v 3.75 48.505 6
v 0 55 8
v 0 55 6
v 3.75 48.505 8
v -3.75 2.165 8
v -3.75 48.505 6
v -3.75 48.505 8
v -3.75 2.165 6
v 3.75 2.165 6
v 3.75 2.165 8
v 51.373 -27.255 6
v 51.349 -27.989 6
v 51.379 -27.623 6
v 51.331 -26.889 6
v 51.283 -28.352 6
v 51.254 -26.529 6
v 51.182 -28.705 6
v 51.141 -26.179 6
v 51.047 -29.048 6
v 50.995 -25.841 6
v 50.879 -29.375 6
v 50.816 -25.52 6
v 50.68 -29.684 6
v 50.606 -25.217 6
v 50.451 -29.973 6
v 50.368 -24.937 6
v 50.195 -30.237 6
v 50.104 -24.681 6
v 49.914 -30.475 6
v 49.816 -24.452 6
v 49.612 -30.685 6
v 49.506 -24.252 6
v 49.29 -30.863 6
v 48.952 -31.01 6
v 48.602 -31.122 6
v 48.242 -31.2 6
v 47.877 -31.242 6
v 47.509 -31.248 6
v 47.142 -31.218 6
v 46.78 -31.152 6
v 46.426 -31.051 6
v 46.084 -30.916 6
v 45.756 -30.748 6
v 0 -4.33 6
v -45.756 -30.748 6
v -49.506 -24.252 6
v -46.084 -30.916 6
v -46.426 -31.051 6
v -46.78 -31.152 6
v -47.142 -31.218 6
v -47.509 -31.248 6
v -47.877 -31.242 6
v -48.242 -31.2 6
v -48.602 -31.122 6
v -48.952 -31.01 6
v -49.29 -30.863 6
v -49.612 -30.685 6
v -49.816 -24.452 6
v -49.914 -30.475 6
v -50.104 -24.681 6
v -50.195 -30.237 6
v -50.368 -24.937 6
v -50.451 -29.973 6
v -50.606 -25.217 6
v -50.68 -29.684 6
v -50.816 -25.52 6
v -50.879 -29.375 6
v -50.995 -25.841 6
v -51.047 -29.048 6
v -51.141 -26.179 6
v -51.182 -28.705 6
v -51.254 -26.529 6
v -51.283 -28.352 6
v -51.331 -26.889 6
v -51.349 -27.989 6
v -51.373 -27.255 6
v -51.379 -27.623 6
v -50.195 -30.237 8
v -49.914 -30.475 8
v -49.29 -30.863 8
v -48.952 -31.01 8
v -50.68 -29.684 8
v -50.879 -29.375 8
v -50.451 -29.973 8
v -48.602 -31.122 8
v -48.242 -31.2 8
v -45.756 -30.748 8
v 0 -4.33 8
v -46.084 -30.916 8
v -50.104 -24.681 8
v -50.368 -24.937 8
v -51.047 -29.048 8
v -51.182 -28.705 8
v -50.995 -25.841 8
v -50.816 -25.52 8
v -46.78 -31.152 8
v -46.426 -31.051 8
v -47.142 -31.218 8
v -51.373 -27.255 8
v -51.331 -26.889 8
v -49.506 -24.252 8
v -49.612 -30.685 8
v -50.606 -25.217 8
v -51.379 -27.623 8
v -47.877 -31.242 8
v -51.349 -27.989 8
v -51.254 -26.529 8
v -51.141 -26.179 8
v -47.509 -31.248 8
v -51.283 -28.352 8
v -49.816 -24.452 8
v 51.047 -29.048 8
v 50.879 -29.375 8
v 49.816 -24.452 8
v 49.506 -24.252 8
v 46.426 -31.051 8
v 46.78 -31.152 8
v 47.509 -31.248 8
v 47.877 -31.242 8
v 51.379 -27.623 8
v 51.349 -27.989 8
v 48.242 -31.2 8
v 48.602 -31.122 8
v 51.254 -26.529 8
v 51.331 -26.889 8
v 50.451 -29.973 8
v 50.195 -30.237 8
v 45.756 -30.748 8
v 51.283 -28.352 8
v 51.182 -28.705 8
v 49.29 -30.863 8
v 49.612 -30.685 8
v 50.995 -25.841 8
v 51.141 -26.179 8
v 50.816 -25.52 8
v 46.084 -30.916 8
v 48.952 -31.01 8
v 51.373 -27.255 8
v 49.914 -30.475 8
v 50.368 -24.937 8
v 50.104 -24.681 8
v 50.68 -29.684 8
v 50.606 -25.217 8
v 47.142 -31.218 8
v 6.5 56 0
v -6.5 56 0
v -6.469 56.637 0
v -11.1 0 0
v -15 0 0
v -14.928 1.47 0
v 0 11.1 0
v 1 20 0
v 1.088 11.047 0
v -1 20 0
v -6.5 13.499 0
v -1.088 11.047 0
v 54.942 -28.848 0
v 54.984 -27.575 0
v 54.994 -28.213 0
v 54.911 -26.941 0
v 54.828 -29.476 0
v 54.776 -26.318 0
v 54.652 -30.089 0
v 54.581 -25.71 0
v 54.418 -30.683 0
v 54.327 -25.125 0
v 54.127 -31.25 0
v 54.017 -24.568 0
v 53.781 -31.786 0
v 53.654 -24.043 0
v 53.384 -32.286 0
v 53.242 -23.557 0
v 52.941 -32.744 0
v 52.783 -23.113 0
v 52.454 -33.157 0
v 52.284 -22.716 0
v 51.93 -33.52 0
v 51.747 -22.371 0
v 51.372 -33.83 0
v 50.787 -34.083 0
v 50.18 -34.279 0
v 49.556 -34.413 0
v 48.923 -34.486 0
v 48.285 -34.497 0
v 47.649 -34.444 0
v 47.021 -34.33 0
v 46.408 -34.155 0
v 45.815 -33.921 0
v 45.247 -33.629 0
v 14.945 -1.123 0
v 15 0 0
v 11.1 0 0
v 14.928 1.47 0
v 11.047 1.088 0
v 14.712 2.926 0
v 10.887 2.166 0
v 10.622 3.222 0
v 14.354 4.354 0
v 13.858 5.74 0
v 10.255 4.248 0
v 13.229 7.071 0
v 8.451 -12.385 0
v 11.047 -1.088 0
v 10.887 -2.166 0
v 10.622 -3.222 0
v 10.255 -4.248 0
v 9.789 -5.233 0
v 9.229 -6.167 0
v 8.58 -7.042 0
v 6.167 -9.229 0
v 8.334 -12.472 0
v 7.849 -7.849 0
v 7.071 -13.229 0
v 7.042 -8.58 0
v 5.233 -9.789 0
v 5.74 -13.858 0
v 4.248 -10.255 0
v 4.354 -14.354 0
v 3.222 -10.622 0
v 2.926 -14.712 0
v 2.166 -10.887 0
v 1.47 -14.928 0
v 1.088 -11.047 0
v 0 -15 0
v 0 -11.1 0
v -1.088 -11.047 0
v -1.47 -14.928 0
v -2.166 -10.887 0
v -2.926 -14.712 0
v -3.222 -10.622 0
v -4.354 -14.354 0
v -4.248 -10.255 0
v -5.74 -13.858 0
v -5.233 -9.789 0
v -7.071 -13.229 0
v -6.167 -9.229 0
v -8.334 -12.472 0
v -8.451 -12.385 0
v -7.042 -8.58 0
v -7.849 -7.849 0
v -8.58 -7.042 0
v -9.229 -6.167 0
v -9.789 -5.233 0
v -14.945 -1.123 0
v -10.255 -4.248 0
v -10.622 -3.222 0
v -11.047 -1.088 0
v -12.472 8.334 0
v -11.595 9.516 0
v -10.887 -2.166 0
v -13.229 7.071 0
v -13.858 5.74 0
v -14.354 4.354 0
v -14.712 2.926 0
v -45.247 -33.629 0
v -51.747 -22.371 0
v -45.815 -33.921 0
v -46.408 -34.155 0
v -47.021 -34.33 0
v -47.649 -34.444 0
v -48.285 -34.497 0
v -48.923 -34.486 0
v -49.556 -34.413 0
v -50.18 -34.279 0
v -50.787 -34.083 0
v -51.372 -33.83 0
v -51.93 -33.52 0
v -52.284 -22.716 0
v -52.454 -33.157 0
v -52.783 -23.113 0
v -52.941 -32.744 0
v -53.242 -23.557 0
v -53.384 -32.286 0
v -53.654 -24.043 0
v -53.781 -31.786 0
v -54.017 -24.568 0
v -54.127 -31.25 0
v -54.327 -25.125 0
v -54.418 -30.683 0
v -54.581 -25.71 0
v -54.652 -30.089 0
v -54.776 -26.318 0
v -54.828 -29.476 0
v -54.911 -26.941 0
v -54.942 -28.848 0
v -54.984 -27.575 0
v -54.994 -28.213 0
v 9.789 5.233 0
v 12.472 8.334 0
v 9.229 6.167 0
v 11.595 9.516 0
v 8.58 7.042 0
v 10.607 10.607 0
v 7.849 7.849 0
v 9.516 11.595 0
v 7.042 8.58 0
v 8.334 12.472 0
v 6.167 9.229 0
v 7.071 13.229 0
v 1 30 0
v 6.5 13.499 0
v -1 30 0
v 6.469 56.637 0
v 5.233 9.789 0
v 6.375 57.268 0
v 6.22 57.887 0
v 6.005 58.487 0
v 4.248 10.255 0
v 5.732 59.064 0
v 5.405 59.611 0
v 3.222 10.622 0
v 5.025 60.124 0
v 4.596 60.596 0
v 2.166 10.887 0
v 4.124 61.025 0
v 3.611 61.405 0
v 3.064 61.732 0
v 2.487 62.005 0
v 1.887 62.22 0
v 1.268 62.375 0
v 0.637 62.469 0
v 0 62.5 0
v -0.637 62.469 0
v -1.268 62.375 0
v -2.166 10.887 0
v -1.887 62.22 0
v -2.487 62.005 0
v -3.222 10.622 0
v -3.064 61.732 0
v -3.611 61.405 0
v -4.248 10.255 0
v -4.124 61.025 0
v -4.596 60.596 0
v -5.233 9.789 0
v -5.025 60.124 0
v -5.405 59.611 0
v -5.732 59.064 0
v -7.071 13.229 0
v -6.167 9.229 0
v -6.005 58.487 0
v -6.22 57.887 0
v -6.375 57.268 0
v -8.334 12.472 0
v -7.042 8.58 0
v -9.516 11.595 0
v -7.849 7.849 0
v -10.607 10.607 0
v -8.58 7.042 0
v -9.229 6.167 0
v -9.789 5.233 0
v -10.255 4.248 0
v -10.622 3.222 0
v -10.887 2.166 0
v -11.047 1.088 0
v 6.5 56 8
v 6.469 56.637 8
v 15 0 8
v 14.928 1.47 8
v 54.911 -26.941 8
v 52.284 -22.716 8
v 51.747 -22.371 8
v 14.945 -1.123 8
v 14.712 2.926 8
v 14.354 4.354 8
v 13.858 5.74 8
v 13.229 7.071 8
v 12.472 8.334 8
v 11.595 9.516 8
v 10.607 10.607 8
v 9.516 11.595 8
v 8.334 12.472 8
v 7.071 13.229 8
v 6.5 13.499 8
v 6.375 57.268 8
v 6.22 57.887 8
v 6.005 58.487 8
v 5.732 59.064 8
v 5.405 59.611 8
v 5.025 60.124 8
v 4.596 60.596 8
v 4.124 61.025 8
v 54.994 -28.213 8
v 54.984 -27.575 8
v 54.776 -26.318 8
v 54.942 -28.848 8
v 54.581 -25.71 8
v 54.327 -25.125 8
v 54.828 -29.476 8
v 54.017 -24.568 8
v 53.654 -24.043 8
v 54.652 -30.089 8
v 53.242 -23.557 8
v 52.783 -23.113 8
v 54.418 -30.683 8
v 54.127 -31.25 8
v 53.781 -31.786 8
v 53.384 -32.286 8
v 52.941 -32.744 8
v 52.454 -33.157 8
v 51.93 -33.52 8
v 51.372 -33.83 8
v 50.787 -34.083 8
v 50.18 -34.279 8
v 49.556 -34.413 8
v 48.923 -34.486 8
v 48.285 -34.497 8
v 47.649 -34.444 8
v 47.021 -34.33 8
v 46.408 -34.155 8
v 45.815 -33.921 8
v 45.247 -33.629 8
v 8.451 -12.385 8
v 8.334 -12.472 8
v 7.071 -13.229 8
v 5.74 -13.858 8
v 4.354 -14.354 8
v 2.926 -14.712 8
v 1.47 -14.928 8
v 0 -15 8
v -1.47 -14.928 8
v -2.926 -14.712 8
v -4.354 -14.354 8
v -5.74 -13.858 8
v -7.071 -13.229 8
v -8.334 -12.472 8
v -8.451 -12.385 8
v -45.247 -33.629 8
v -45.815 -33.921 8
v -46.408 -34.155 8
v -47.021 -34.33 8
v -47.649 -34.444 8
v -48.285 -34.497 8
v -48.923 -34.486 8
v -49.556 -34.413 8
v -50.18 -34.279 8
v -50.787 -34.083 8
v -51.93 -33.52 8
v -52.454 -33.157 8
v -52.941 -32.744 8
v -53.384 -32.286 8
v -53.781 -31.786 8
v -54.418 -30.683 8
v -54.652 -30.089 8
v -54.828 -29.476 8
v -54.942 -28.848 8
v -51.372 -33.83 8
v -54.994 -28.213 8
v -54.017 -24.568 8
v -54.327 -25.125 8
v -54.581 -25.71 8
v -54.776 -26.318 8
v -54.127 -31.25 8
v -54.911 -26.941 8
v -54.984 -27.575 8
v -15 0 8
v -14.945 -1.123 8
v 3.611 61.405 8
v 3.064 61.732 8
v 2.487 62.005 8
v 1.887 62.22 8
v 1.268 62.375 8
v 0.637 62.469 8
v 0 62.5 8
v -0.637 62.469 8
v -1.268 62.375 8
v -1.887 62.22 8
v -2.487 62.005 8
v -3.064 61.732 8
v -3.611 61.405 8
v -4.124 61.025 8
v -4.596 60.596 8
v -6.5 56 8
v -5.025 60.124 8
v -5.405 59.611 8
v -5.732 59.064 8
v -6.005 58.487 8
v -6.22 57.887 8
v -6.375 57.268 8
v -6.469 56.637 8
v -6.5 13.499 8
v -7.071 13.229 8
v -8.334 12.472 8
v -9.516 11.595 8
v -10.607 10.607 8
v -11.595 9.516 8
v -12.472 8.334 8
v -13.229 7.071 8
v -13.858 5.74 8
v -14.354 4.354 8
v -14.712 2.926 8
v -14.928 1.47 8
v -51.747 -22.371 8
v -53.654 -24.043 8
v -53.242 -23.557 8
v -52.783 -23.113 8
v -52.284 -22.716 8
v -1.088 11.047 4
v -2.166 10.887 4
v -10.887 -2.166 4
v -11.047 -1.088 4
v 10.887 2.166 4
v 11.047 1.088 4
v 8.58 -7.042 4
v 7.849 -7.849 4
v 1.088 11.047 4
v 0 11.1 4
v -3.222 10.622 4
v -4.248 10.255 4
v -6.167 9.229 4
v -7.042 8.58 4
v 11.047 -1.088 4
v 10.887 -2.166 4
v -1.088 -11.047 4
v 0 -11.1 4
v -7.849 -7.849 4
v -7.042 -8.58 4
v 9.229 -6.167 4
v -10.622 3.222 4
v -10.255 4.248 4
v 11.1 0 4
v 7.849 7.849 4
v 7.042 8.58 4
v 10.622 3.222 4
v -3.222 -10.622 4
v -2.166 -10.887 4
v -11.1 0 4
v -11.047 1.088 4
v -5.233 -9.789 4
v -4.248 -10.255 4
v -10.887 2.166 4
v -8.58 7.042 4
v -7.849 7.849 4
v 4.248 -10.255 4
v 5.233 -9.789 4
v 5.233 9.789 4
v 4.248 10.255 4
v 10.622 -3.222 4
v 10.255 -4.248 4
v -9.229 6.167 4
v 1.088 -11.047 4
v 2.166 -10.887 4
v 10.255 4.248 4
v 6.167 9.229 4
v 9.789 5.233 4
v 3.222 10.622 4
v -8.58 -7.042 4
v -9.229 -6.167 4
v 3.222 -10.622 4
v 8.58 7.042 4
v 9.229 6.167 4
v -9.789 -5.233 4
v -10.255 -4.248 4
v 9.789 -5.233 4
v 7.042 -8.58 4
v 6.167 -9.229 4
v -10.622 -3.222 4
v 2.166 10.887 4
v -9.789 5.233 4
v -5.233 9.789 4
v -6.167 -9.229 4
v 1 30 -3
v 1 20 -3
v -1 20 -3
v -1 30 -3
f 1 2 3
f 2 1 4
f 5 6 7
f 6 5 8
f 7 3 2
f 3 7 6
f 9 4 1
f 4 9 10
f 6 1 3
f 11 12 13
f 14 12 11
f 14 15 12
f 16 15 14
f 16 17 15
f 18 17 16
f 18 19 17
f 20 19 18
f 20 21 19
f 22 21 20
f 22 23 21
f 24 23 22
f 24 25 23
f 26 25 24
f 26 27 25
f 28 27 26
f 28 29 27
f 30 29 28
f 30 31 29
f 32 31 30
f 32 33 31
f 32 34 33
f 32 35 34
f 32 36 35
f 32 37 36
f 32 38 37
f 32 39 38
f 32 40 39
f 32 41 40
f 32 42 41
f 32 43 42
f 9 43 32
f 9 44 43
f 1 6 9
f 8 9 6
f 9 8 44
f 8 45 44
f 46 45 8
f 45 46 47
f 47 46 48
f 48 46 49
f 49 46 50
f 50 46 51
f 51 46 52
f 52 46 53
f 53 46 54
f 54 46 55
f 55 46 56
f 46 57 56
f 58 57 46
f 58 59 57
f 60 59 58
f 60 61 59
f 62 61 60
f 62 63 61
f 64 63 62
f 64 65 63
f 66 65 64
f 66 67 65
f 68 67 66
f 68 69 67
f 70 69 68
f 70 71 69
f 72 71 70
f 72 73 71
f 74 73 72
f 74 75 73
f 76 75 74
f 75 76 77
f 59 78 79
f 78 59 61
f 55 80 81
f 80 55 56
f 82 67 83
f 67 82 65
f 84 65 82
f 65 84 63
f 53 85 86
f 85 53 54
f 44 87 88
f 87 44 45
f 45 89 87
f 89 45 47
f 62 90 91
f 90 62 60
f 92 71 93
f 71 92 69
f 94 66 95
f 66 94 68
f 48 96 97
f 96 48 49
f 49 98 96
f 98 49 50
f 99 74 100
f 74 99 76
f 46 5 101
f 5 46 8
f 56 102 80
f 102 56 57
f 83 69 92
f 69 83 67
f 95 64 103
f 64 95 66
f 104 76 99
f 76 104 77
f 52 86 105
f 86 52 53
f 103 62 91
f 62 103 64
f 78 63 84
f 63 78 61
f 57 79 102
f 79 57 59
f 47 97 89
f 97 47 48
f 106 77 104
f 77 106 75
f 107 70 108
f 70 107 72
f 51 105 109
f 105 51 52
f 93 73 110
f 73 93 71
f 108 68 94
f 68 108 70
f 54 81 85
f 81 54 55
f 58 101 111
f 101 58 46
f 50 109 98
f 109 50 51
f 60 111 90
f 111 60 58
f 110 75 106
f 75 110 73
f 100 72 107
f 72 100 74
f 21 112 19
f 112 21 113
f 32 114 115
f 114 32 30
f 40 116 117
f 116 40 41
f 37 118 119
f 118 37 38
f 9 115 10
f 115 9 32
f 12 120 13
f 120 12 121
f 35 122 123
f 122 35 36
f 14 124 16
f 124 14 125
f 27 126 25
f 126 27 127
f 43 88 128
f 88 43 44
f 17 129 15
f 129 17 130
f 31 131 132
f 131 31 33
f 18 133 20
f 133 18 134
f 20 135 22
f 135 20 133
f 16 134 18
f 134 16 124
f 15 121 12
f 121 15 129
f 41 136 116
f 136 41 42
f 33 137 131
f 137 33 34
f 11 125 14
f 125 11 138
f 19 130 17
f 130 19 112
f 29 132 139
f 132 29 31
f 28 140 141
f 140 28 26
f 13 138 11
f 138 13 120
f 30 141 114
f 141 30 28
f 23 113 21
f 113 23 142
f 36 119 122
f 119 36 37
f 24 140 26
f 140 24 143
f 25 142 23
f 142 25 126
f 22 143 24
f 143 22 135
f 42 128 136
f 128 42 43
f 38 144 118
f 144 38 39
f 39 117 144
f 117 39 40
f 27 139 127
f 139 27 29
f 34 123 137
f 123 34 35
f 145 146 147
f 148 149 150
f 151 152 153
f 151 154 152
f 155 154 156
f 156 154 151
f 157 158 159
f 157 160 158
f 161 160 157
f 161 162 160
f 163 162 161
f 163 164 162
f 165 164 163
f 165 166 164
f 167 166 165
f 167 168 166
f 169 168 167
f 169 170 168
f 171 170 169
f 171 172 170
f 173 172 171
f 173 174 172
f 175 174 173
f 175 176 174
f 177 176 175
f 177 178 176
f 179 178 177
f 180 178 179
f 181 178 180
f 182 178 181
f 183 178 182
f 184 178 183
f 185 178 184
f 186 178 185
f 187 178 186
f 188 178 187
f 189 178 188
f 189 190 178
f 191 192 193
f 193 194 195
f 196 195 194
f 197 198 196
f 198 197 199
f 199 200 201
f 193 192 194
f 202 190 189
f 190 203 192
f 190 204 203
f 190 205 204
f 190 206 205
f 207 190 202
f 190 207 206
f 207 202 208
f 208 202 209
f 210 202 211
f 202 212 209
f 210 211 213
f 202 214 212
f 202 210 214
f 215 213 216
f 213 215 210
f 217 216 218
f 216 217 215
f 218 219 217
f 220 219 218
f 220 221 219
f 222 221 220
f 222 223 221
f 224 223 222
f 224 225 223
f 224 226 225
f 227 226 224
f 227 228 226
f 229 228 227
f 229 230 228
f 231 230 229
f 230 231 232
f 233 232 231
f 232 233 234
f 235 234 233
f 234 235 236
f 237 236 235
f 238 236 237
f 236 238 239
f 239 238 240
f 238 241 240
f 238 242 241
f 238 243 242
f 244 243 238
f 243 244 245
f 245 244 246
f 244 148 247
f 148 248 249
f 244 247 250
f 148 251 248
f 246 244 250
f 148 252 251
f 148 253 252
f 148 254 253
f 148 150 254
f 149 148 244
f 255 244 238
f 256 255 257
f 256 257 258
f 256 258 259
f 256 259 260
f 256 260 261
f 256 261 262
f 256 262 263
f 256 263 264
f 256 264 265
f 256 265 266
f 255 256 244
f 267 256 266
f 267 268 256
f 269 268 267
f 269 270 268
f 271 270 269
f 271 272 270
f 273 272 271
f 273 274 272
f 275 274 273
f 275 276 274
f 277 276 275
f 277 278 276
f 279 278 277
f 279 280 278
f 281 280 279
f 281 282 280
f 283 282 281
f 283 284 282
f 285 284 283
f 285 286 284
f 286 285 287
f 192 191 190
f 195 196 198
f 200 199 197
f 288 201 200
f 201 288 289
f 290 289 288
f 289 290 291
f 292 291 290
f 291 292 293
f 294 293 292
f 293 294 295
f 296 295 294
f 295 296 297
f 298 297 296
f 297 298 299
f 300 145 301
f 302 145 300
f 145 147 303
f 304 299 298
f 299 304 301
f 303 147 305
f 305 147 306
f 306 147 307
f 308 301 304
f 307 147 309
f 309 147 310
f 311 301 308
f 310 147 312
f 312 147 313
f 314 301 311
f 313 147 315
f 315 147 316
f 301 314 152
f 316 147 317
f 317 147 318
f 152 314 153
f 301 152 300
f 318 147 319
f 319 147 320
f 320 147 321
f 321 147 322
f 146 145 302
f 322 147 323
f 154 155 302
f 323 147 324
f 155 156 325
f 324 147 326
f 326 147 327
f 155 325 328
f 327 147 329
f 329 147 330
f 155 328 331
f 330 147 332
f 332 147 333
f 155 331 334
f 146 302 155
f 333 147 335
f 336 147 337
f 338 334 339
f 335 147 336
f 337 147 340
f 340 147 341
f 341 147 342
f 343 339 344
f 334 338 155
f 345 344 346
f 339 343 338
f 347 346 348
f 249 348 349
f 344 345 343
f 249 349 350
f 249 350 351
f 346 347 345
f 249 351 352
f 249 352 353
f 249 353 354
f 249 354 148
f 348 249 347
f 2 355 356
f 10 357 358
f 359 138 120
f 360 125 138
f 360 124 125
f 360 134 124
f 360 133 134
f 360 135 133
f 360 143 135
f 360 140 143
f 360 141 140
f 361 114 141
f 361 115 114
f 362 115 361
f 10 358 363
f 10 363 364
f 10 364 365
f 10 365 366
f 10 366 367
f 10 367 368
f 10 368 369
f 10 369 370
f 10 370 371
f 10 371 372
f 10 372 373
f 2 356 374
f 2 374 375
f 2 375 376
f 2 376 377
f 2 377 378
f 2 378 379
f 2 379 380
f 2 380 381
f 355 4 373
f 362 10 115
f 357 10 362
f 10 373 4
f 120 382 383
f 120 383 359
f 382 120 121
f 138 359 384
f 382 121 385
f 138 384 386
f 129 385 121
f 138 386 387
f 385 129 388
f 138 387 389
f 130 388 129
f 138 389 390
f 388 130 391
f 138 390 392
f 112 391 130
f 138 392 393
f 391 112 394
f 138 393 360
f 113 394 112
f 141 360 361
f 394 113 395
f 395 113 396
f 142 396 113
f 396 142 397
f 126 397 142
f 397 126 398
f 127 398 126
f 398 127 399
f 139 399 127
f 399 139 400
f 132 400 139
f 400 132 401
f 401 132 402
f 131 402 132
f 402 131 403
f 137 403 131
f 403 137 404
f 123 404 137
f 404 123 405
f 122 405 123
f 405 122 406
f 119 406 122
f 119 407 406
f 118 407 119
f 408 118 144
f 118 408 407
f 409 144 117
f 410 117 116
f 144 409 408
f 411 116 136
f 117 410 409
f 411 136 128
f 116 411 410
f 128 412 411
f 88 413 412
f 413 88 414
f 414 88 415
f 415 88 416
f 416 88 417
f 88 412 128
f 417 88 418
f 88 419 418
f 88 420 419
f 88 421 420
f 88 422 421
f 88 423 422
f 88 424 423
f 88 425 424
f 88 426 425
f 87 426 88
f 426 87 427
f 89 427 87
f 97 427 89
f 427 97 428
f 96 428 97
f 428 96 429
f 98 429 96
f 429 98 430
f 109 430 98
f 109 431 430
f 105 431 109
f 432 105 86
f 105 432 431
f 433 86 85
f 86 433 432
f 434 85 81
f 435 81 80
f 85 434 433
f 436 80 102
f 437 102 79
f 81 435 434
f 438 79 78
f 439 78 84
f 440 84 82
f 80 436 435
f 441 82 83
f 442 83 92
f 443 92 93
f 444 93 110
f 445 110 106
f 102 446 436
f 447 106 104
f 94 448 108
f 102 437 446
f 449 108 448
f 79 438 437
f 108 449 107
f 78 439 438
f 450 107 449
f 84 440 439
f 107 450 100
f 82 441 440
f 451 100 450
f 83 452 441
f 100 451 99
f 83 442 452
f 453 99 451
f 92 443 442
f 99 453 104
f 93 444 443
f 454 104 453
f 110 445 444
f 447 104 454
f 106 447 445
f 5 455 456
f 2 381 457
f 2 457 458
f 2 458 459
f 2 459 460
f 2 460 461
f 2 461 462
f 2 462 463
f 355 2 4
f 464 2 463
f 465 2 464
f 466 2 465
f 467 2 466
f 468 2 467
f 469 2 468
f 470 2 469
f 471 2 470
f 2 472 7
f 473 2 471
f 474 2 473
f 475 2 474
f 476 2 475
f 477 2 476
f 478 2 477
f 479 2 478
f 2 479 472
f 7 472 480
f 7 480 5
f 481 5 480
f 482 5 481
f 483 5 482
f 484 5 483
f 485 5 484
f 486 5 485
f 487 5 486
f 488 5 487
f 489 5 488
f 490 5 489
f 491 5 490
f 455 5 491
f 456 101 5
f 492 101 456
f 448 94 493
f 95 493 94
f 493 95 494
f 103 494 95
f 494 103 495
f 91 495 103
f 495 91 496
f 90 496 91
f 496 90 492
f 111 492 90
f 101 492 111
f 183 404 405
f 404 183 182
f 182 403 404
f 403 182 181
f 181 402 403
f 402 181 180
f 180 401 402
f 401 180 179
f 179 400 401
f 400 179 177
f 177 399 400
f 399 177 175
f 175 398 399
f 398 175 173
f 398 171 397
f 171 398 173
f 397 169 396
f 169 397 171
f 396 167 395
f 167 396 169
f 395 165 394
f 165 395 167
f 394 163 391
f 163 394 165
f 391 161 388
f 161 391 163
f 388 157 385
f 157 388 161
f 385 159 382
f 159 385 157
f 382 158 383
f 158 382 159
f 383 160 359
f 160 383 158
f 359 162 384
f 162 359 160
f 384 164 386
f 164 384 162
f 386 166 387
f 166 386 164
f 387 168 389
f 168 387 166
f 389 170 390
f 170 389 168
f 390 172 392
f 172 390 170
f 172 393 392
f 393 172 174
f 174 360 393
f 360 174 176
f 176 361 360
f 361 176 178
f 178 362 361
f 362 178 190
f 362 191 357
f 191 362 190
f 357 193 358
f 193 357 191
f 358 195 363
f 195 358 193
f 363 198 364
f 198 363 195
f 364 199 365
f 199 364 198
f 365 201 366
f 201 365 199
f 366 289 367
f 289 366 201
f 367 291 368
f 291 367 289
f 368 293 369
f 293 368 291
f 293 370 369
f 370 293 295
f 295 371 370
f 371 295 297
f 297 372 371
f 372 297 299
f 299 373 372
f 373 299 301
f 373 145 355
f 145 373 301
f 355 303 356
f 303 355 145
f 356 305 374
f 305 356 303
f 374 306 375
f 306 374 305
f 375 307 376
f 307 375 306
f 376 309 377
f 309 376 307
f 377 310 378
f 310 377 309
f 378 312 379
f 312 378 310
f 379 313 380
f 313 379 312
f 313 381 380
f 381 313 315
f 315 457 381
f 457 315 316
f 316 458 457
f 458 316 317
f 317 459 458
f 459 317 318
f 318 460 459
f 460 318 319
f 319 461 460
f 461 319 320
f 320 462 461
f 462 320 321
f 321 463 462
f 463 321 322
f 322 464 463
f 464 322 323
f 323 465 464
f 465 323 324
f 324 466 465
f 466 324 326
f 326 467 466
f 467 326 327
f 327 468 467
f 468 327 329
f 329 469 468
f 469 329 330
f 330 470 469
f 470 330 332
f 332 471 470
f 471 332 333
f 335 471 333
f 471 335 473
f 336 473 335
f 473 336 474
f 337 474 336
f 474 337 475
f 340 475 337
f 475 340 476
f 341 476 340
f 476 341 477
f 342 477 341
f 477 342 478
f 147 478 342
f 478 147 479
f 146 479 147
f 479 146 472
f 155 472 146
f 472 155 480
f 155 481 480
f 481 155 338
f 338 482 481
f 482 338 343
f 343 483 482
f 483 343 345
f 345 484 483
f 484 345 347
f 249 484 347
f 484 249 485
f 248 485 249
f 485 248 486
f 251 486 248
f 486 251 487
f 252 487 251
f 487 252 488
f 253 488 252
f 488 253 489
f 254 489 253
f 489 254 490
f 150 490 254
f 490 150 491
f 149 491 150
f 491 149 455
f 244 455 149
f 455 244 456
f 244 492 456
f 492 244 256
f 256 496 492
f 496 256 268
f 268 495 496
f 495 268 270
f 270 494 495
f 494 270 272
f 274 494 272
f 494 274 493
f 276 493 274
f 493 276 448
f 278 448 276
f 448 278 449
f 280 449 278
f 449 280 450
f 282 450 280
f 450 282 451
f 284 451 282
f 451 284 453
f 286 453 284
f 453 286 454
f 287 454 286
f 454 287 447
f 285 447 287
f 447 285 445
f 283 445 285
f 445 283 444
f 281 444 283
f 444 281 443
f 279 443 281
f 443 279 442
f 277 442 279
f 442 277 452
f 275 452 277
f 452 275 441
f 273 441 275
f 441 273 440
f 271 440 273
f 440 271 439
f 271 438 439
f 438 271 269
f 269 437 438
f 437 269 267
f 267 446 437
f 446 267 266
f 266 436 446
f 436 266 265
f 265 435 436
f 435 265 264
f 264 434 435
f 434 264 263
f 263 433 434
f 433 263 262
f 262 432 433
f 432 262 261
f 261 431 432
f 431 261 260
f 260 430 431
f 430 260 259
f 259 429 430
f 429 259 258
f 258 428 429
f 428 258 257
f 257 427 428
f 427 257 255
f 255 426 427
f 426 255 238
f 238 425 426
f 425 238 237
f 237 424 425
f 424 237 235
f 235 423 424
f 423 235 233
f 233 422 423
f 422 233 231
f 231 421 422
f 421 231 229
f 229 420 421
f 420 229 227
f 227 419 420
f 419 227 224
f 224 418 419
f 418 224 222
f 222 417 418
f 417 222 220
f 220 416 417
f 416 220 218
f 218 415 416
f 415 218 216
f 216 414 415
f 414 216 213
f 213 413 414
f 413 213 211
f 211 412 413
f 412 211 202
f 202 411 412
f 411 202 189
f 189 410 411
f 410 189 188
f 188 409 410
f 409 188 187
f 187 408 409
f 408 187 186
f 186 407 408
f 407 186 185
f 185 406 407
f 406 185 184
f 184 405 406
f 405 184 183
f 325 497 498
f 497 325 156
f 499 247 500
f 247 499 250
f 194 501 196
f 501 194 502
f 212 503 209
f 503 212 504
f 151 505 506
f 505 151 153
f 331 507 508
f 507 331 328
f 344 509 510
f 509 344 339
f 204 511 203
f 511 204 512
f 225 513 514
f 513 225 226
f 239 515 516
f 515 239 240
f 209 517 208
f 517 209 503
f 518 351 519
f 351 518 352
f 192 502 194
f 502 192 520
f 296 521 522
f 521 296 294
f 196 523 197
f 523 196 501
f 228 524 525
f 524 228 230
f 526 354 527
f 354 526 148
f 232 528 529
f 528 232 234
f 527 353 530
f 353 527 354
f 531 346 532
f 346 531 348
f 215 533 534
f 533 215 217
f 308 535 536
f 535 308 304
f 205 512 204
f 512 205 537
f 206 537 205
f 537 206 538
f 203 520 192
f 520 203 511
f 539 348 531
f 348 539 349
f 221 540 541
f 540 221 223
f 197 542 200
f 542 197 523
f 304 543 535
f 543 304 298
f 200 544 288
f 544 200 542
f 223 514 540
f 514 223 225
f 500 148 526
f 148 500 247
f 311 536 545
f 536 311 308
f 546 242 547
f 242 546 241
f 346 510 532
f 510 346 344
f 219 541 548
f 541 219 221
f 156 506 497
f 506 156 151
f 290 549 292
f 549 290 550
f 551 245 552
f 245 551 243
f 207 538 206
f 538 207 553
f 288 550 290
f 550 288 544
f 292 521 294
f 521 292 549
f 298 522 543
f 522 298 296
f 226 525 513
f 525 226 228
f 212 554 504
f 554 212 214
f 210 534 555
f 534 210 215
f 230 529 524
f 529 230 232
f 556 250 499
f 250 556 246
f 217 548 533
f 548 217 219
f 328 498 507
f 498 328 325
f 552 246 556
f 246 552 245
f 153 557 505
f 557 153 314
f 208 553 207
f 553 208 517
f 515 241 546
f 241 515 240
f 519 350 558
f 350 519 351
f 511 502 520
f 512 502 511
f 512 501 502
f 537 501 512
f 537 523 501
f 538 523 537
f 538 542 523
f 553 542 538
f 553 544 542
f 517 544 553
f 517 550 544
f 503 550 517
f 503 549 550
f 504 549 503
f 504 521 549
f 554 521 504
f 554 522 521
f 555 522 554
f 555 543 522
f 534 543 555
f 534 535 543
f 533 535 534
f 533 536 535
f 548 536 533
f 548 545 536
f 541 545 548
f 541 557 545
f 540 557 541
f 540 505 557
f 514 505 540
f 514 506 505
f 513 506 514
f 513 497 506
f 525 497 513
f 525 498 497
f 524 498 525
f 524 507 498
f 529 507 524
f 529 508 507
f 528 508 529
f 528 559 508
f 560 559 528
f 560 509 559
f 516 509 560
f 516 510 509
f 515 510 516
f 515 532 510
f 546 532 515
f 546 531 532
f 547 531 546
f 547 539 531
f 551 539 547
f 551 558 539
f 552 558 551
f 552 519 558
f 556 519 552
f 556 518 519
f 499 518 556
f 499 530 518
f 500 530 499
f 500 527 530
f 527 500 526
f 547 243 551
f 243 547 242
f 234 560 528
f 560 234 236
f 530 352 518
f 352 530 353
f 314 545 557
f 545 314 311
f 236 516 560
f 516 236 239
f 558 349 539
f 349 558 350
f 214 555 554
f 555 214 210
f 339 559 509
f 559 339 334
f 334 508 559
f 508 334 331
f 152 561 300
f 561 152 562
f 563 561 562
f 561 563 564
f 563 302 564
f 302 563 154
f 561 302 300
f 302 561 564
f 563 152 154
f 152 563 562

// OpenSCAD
// ===================================================================
// Lazy Susan + Mirror Stand (combined)
//
// Merges lazy-susan.scad (the rotating 3-arm plate + its stationary
// base) with mirror_stand.scad (the leaning mirror stand) into one
// solid piece: the mirror stand's flat plate overlaps the lazy susan's
// stationary base disc all the way to the disc's center (the spinner
// axis), rather than just touching its edge. The disc stays a full
// circle underneath (so the small center post that the spinner's
// bearing insert mounts to stays solid, not cut in half) but the
// rectangle covers its entire back half, so in silhouette the fused
// base reads as a true Norman window -- a semicircle capping a
// rectangle, one continuous outline with no notch, gap, or seam.
//
// The spinner itself is otherwise untouched — same geometry as
// lazy-susan.scad, centered on the Z axis. Only the mirror stand's
// raised boss (the part tall enough to reach the spinner's rotation
// plane) is set back far enough that it sits mirror_clearance mm
// beyond the circle the spinner's arm tips sweep out, so the arms spin
// freely and just barely miss it. The thin flat plate itself can
// safely run right through the spinner's footprint because it's well
// below spinner height -- only the boss needs the clearance.
//
// A rotation-stop mechanism limits the spinner to exactly 180 degrees
// of travel: a tab hangs below the spinner's pointed (90-degree) arm,
// and two matching tabs rise from the base's floor, positioned so the
// spinner can swing only from the pointer aimed at the mirror to
// aimed directly away from it. See the "Rotation stop" parameter group
// and the spinner_stop_tab() / base_stop_tabs() modules for details.
//
// Preview mode picks which of the two parts to show (they print
// separately): the spinner plate, or the fused base + mirror stand.
//
// Axes: X/Y = footprint, Z = up, both parts sit on Z = 0. The spinner
// is centered on the origin; the mirror stand sits behind it along
// +X, centered on Y = 0, leaning back away from the spinner (its
// mirror faces toward -X, i.e. toward the spinner/viewer).
// ===================================================================

/* [Preview mode] */
show_spinner = true;  // true: show 3-arm spinner, false: show fused base + mirror stand

/* [Dimensions of the object (mm)] */
leg_diameter          = 3;    // must match leg_diameter in impossible.scad
foot_height           = 2;    // must match foot_height in impossible.scad
foot_width_90         = 7;    // must match foot_width_90 in impossible.scad
foot_diameter_others  = 7;    // must match foot_diameter_others in impossible.scad
object_width          = 110;  // must match width in impossible.scad; sets how far the groove arms reach

/* [Overall plate dimensions (mm)] */
box_height   = 8;    // Z: overall plate thickness
arm_length   = object_width / 2 + 1;   // center to rounded outer tip of each arm
arm_width    = 13;   // width of each arm (main shape tuning parameter)
hub_diameter = 30;   // central round hub joining the three arms

/* [Lazy susan base dimensions (mm)] */
base_height          = 3;
base_radius          = object_width / 3;
base_center_diameter = 10;
base_center_extra    = 1;    // center cylinder rises this much above base_height
base_top_extra       = 6.5;  // top post rises this much above center cylinder
base_top_radius      = 3.9;

/* [Top groove for the impossible-object feet] */
groove_clearance      = .5;    // groove is this much wider than the feet
groove_depth          = foot_height;  // groove depth matches the foot so it sits fully recessed
groove_length         = object_width / 2;  // length of each arm from the center

/* [Bottom insert pocket (mm)] */
insert_diameter       = 22;    // your round insert diameter
insert_clearance      = 0.2;   // small added diameter for snug fit
insert_pocket_depth   = 4;     // pocket depth from bottom face

/* [Mirror] */
mirror_base_depth = 6;   // front-to-back thickness of the mirror's plastic base

/* [Mirror lean] */
lean_angle = 86;          // desired angle of the mirror from horizontal (90 = vertical)
tilt = -(90 - lean_angle); // negative so the slot leans the mirror toward its front edge

/* [Mirror slot] */
eps = 0.3;                            // clearance so the mirror base slides in freely
slot_gap   = mirror_base_depth + eps; // front-to-back width of the slot
slot_depth = 10;                      // vertical depth of the (blind) slot

/* [Mirror stand base] */
// stand_width matches the lazy-susan base disc's diameter, and
// plate_thickness matches base_height, and front_apron is derived from
// the spinner clearance below (under Derived values) -- see there for
// why these aren't free parameters here.
back_apron      = 13;   // X: plate material behind the slot
floor_thickness = 3;    // solid material below the slot floor (within the boss)
boss_margin     = 5;    // X: extra boss material in front of and behind the slot

/* [Mirror stand corners] */
plate_corner_radius = 3;  // rounding radius of the plate's back two footprint corners
boss_corner_radius  = 3;  // rounding radius of the boss's footprint corners
corner_fn = 32;            // smoothness of the rounded corners

/* [Fit between spinner and mirror stand] */
// Extra gap, beyond the bare minimum, between the spinner arm tips'
// swept circle and the mirror stand's front edge.
mirror_clearance = 1.5;

/* [Rotation stop] */
// A tab hanging below the spinner's pointed (90-degree) arm, plus two
// matching tabs rising from the base, limit the spinner to exactly 180
// degrees of rotation: from the pointed arm aimed at the mirror to
// aimed directly away from it. All three tabs share the same radial
// span and width; see the Derived values / module comments below for
// how they're positioned to interlock.
stop_width = 2;   // mm, tangential width of each stop tab
stop_r_in  = 20;  // mm, inner radius of the stop tabs
stop_r_out = 30;  // mm, outer radius of the stop tabs
stop_drop  = 3;   // mm, how far the spinner's tab hangs below its bottom face
stop_rise  = 3;   // mm, how far the base's tabs rise above the floor

/* [Preview / debug helpers] */
show_top_groove = true;

plate_color = "DeepSkyBlue";
stand_color = "DeepSkyBlue";

$fn = 64;

// ===== Checks =====
assert(arm_width > max(leg_diameter, foot_width_90, foot_diameter_others) + groove_clearance,
    "arm_width must be wider than the widest groove arm");
assert(hub_diameter >= arm_width,
    "hub_diameter should be at least arm_width so the center blend stays smooth");
assert(groove_depth > 0 && groove_depth < box_height,
    "groove_depth must be greater than 0 and less than box_height");
assert(insert_pocket_depth > 0 && insert_pocket_depth < box_height,
    "insert_pocket_depth must be greater than 0 and less than box_height");
assert(base_height > 0 && base_radius > 0,
    "base_height and base_radius must be positive");
assert(base_center_diameter > 0 && base_top_radius > 0,
    "base_center_diameter and base_top_radius must be positive");
assert(groove_length + max(leg_diameter, foot_width_90, foot_diameter_others) / 2 + groove_clearance
        <= arm_length + arm_width / 2,
    "groove arms reach past the end of the plate arm; decrease groove_length/object_width or increase arm_length");
assert(groove_length > (foot_width_90 + groove_clearance) * sqrt(3) / 2,
    "groove_length is too short for the fish-eye tip on the 90-degree arm; increase groove_length/object_width or decrease foot_width_90/groove_clearance");
assert(mirror_clearance >= 0, "mirror_clearance must not be negative");
assert(stop_width > 0 && stop_width < arm_width,
    "stop_width must be positive and narrower than arm_width so the spinner's tab stays inside the pointed arm");
assert(stop_r_in > hub_diameter / 2 && stop_r_in < stop_r_out,
    "stop_r_in must be past the hub and less than stop_r_out");
assert(stop_r_out < arm_length && stop_r_out < base_radius,
    "stop_r_out must be less than both arm_length (so it stays on the spinner's arm) and base_radius (so the away-from-mirror base tab has a full disc under it)");
assert(stop_drop > 0 && stop_rise > 0, "stop_drop and stop_rise must be positive");

// ===== Derived values =====

// Radius of the circle swept by the spinner arms' rounded tips.
spinner_sweep_radius = arm_length + arm_width / 2;

// The mirror stand's width matches the lazy-susan base disc's diameter,
// so the stand reads as a continuation of the disc rather than a
// mismatched width.
stand_width = 2 * base_radius;

// The mirror plate is the same thickness as the lazy-susan base, so
// the two flat footprints fuse into one seamless "Norman window" shape
// (circle + rectangle, sharing one flat top face) with no bridge piece
// and no seam.
plate_thickness = base_height;

// Front-to-back footprint of the mirror stand's slot boss.
boss_depth = slot_gap + 2 * boss_margin;
boss_height = slot_depth + floor_thickness;        // Z: total height at the boss, from Z=0

// The mirror stand's local origin (X = 0, its front-left corner in
// mirror_stand.scad's own axes) sits at the spinner axis itself -- the
// rectangle's flat front edge passes right through the disc's center,
// covering the disc's whole front half. No cutting is needed: the disc
// stays a full circle underneath (so the center post / bearing mount
// stays solid and full-strength), and the union of full-circle disc +
// rectangle-through-the-center reads, in silhouette, as exactly a
// Norman window (semicircle capping a rectangle) -- the rectangle
// simply overlaps and covers where the disc's front half would show.
stand_origin_x = 0;
stand_origin_y = -stand_width / 2;

// Local-to-the-stand X position of the boss's near (front) edge: far
// enough from the world origin (spinner axis) that the boss clears the
// spinner's swept circle by mirror_clearance.
boss_near_x = spinner_sweep_radius + mirror_clearance - stand_origin_x;
slot_x      = boss_near_x + boss_margin + slot_gap / 2; // X: center of the slot, local to the stand

front_apron = slot_x - slot_gap / 2; // X: plate material in front of the slot, local to the stand
base_depth  = front_apron + slot_gap + back_apron; // X: total mirror-stand footprint depth

assert(boss_near_x >= 0,
    "mirror stand's boss would start before the disc's edge; increase mirror_clearance or base_radius, or decrease spinner_sweep_radius");

// ===== Spinner geometry (unchanged from lazy-susan.scad) =====

// Rounded 2D arm using two equal circles so both ends are curved.
module arm_capsule_2d(l, w) {
    hull() {
        circle(d = w);
        translate([l, 0])
            circle(d = w);
    }
}

// Symmetric three-arm footprint with curved outer ends.
module three_arm_plate_2d(l, w, hub_d) {
    union() {
        circle(d = hub_d);
        for (a = [90, 210, 330])
            rotate([0, 0, a])
                arm_capsule_2d(l, w);
    }
}

// Straight-sided slot, width w, that the almond-shaped foot on the
// 90-degree leg can slide down into.
module fisheye_slot_2d(w, l) {
    tip_reach = w * sqrt(3) / 2;
    straight_end = l - tip_reach;
    union() {
        circle(d = w);
        polygon(points = [
            [0, -w / 2],
            [straight_end, -w / 2],
            [l, 0],
            [straight_end, w / 2],
            [0, w / 2],
        ]);
    }
}

// Y-shaped centering groove sunk into the top face.
module top_groove() {
    for (a = [90, 210, 330]) {
        gw = max(leg_diameter,
                 a == 90 ? foot_width_90 : foot_diameter_others)
             + groove_clearance;
        rotate([0, 0, a])
            linear_extrude(height = groove_depth + 1)
                if (a == 90)
                    fisheye_slot_2d(gw, groove_length);
                else
                    hull() {
                        circle(d = gw);
                        translate([groove_length, 0])
                            circle(d = gw);
                    }
    }
}

// Rotation-stop tab on the spinner: a rib centered on the pointed
// (90-degree) arm's centerline (the local +Y axis), running from
// stop_r_in to stop_r_out and hanging stop_drop mm below the spinner's
// flat bottom face (Z = 0). Meets the two stop tabs on the base (see
// base_stop_tabs() below) to limit the spinner to exactly 180 degrees
// of rotation. Printable without supports: the model's bottom face
// (Z = 0) is the face placed UP when printing groove-side-down per the
// notes at the end of this file, so this tab prints as a simple
// upward-facing rib, not an overhang.
module spinner_stop_tab() {
    translate([-stop_width / 2, stop_r_in, -stop_drop])
        cube([stop_width, stop_r_out - stop_r_in, stop_drop]);
}

module lazy_susan_plate() {
    union() {
        difference() {
            linear_extrude(height = box_height)
                three_arm_plate_2d(arm_length, arm_width, hub_diameter);

            // Round recess in the underside for a press-fit insert.
            translate([0, 0, -1])
                cylinder(d = insert_diameter + insert_clearance,
                         h = insert_pocket_depth + 1);

            if (show_top_groove)
                translate([0, 0, box_height - groove_depth])
                    top_groove();
        }
        spinner_stop_tab();
    }
}

module lazy_susan_base() {
    union() {
        cylinder(r = base_radius, h = base_height);
        cylinder(d = base_center_diameter, h = base_height + base_center_extra);
        translate([0, 0, base_height + base_center_extra])
            cylinder(r = base_top_radius, h = base_top_extra);
    }
}

// Rotation-stop tabs on the base: two ribs, stop_rise mm tall, rising
// from the floor (Z = base_height). One sits just past the "toward
// mirror" radial line (+X, X from stop_r_in to stop_r_out) and the
// other just past the "away from mirror" line (-X, mirrored). Both are
// offset stop_width / 2 to the -Y side of their line (rather than
// centered on it): since the spinner's tab is centered on its own line
// when it's aimed exactly at (or away from) the mirror, offsetting the
// base tab by half the spinner tab's width means the two tabs' facing
// edges meet exactly at that moment, not before or after it. Both
// tabs use the same -Y offset -- not mirrored left/right -- because
// that is the side that blocks the spinner from swinging past either
// end of its 180-degree arc; see the geometry note below.
//
// Geometry: picture the spinner tab starting centered on the +X line
// (pointer aimed at the mirror), resting against the first base tab.
// Rotating the spinner counterclockwise lifts its tab away (+Y) from
// that base tab and sweeps it through the +Y half-plane; by the time
// it reaches the -X line (pointer aimed away from the mirror), the
// tab has swung back down to meet the second base tab from the same
// -Y side. So both stops sit on -Y, and the spinner is confined to the
// 180-degree arc between them.
module base_stop_tab(x0, x1) {
    translate([x0, -(stop_width / 2 + stop_width), base_height])
        cube([x1 - x0, stop_width, stop_rise]);
}

module base_stop_tabs() {
    union() {
        base_stop_tab(stop_r_in, stop_r_out);    // toward the mirror (+X)
        base_stop_tab(-stop_r_out, -stop_r_in);  // away from the mirror (-X)
    }
}

// ===== Mirror stand geometry (same as mirror_stand.scad; stand_width
// is now derived from base_radius, plate_thickness matches base_height,
// and the plate's front edge is square instead of rounded -- it sits
// buried inside the disc's front half rather than at a visible seam,
// but square keeps the overlap simple and fully solid) =====

// A box with its footprint (XY) corners rounded, straight from Z=0 to h.
module rounded_box(x, y, h, r) {
    assert(r <= min(x, y) / 2, "rounded_box: corner radius too large for box footprint");
    hull() {
        for (i = [r, x - r], j = [r, y - r])
            translate([i, j, 0])
                cylinder(r = r, h = h, $fn = corner_fn);
    }
}

// Like rounded_box, but only the two corners at X = x (the far/back
// end) are rounded; the two corners at X = 0 stay square. Used for the
// mirror plate, whose front edge sits at the spinner axis, buried
// inside the lazy-susan disc's front half.
module back_rounded_box(x, y, h, r) {
    assert(r <= min(x, y) / 2, "back_rounded_box: corner radius too large for box footprint");
    hull() {
        cube([0.001, y, h]);
        for (j = [r, y - r])
            translate([x - r, j, 0])
                cylinder(r = r, h = h, $fn = corner_fn);
    }
}

module mirror_plate() {
    back_rounded_box(base_depth, stand_width, plate_thickness, plate_corner_radius);
}

module mirror_boss() {
    translate([slot_x - boss_depth / 2, 0, 0])
        rounded_box(boss_depth, stand_width, boss_height, boss_corner_radius);
}

module mirror_slot_cutter() {
    overcut   = 4;  // extra length so the cutter fully clears both sides of the stand
    top_pad   = 2;  // extra length so the cutter pokes above the top face for a clean cut
    cutter_len = slot_depth / cos(tilt) + top_pad;

    translate([slot_x, stand_width / 2, boss_height])
        rotate([0, tilt, 0])
            translate([-slot_gap / 2, -stand_width / 2 - overcut / 2, top_pad - cutter_len])
                cube([slot_gap, stand_width + overcut, cutter_len]);
}

module mirror_stand() {
    difference() {
        union() {
            mirror_plate();
            mirror_boss();
        }
        mirror_slot_cutter();
    }
}

// ===== Combined base: lazy susan base disc fused with the mirror
// stand's flat plate, overlapping all the way to the disc's center
// (no gap, no bridge). The disc stays a full circle for a solid center
// post, but the rectangle covers its back half, so the outline reads
// as a Norman window: rectangle capped by a semicircle. Only the
// raised boss, which actually reaches spinner height, is set back to
// clear the spinning arms. =====

module base_and_mirror_stand() {
    union() {
        lazy_susan_base();
        base_stop_tabs();
        translate([stand_origin_x, stand_origin_y, 0])
            mirror_stand();
    }
}

echo(str("Spinner: 3-arm, height ", box_height, " mm, sweep radius ", spinner_sweep_radius, " mm"));
echo(str("Top groove: ", groove_depth, " mm deep, arms ", groove_length, " mm long"));
echo(str("Bottom insert pocket: d=", insert_diameter + insert_clearance,
         " mm, depth=", insert_pocket_depth, " mm"));
echo(str("Lazy susan base: r=", base_radius, " mm, h=", base_height,
         " mm, center d=", base_center_diameter,
         " mm, top post r=", base_top_radius, " mm"));
echo(str("Mirror stand: base_depth=", base_depth, " mm, stand_width=", stand_width,
         " mm (matches lazy-susan base diameter), flat plate flush against the disc (no gap)"));
echo(str("Mirror stand boss (holds the mirror) sits at X=", stand_origin_x + boss_near_x,
         " mm from the spinner axis, ", mirror_clearance,
         " mm beyond the spinner's swept circle (radius ", spinner_sweep_radius, " mm)"));
echo(str("Rotation stop: tabs from r=", stop_r_in, " to r=", stop_r_out,
         " mm, ", stop_width, " mm wide -- limits the spinner to 180 degrees",
         " (pointer at the mirror to pointer away from it)"));

if (show_spinner)
    color(plate_color) lazy_susan_plate();
else
    color(stand_color) base_and_mirror_stand();

// ===================================================================
// Printing notes
// ===================================================================
// Two separate prints:
//   - show_spinner = true:  the 3-arm spinner plate. Print top (groove)
//     face DOWN on the build plate, same as before -- this also puts
//     the rotation-stop tab (which hangs below the bottom/Z=0 face)
//     pointing straight UP once flipped onto the bed, so it prints as
//     a simple upright rib with no overhang and needs no supports.
//   - show_spinner = false: the fused lazy-susan base + mirror stand.
//     Print flat side down (Z = 0); the two base stop tabs and the
//     mirror boss all rise from that same flat face, so this also
//     needs no supports.
// ===================================================================
